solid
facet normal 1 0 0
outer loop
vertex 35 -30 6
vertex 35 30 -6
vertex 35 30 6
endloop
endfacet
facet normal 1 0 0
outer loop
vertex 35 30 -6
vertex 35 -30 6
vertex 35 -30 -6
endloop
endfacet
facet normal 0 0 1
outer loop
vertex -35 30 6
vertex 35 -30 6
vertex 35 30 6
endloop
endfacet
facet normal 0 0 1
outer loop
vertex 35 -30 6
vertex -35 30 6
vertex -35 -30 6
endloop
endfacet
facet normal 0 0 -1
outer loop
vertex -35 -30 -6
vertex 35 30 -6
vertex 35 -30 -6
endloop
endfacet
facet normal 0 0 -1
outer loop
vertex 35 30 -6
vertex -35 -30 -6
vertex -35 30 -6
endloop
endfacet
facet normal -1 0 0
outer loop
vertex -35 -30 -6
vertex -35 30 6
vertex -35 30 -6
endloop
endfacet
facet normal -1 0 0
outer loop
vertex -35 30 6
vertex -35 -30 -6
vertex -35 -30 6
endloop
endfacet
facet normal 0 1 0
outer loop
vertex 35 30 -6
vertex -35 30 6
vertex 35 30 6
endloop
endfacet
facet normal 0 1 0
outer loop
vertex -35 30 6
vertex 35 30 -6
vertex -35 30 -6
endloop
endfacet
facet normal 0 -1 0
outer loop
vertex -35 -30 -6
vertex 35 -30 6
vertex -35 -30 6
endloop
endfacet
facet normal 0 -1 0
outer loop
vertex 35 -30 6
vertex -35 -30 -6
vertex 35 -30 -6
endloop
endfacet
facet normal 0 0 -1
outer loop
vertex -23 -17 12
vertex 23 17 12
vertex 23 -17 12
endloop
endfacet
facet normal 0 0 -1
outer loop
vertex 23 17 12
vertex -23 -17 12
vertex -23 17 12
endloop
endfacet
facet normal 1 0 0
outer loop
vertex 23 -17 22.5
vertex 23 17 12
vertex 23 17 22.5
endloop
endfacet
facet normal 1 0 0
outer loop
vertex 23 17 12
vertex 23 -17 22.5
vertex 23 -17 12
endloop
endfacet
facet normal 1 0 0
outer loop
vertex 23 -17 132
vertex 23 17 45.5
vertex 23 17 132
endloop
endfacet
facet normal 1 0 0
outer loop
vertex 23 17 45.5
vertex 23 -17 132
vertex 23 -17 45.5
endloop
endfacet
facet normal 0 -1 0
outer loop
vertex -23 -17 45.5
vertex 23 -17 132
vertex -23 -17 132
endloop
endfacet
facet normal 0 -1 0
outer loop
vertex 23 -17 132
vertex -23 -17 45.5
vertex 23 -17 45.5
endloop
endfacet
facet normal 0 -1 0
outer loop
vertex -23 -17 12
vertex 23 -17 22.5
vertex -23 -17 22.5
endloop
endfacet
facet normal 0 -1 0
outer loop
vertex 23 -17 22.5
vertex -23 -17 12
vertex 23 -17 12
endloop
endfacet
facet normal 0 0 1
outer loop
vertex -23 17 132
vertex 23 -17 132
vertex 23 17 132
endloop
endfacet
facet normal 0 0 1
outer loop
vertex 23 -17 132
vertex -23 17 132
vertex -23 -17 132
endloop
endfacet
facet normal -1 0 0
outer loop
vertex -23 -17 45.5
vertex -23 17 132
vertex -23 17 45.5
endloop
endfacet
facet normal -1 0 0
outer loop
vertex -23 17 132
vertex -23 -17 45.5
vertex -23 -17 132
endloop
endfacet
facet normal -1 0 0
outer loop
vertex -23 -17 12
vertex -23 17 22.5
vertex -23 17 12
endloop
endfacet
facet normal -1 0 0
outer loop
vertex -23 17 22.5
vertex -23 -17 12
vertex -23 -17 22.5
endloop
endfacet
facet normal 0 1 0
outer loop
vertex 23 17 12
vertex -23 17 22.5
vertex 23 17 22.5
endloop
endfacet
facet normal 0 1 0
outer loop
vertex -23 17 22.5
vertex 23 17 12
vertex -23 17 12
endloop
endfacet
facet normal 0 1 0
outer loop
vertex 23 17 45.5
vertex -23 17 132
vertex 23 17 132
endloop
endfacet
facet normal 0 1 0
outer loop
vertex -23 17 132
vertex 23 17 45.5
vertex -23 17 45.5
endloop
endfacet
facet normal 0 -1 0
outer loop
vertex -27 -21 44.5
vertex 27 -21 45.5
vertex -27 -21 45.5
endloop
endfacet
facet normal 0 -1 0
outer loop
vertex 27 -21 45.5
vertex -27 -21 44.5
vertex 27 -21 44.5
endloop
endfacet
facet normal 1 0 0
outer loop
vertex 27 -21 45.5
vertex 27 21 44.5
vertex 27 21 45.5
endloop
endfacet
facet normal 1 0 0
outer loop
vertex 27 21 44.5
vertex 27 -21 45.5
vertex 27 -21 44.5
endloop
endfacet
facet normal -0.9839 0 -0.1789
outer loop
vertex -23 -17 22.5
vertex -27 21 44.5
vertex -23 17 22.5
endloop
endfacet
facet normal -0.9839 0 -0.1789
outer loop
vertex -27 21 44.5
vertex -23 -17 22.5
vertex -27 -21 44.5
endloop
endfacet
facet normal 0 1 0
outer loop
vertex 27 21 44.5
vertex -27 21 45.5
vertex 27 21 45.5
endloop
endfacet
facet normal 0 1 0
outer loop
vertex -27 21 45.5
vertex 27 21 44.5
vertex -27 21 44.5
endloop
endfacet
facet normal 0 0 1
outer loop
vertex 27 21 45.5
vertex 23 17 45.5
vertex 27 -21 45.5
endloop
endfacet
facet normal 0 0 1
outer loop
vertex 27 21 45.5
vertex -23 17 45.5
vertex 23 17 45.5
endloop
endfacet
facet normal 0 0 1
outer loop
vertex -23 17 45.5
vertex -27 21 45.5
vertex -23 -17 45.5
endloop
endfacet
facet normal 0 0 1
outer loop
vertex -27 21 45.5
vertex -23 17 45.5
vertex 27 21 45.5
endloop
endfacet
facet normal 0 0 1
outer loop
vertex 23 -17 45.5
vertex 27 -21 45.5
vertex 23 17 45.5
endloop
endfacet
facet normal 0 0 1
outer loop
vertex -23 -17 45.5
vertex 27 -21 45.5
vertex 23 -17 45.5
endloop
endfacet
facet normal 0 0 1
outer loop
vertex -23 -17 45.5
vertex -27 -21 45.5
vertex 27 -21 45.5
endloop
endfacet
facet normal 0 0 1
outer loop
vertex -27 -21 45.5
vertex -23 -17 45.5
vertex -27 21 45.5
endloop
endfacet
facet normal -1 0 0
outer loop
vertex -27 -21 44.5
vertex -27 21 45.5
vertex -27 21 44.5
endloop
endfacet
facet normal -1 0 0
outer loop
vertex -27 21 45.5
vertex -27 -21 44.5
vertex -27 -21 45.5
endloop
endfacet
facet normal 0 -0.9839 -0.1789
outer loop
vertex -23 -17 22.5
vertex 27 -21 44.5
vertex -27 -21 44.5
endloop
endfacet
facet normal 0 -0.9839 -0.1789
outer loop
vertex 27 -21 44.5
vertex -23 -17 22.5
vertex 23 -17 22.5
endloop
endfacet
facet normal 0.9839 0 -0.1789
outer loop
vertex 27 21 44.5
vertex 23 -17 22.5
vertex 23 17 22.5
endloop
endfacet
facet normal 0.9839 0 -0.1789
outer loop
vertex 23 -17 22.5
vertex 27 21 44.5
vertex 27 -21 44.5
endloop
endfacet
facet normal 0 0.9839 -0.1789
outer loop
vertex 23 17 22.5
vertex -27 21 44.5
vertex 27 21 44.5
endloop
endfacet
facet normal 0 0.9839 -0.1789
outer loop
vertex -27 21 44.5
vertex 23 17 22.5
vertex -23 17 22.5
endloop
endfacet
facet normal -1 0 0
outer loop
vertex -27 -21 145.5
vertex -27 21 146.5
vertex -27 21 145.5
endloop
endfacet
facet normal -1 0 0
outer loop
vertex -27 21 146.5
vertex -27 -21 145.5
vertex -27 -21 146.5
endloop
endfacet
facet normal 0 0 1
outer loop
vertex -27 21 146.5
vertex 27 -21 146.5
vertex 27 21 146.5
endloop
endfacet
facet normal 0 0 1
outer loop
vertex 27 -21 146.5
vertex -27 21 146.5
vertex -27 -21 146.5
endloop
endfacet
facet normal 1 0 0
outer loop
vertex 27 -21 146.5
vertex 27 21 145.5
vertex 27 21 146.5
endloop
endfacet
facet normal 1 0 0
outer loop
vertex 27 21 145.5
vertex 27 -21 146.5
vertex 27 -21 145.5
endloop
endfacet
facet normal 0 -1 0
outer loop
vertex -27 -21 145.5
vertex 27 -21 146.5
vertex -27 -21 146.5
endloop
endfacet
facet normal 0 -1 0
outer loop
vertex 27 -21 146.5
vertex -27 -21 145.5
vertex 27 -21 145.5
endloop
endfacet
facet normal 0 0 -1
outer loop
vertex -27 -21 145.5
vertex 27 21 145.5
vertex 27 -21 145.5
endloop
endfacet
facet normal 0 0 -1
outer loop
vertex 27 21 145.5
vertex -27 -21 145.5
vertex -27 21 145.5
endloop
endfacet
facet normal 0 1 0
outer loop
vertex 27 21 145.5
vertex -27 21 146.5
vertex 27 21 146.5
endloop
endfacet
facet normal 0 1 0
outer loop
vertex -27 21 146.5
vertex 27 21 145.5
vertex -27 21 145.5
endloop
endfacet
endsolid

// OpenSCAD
module ceremonial_shelf_totem(
overall_h=160,
overall_w=70,
overall_d=60,
base_h=12,
thickness=6,
body_w=46,
body_d=34,
shoulder_h=22,
top_taper_h=28,
foot_overhang=2
){
base_w = overall_w;
base_d = overall_d;

union() {
// Low, stable base
translate([0,0,0])
cube([base_w, base_d, base_h], center=true);

// Main column, centered to keep CG low and predictable
translate([0,0,base_h + (overall_h - base_h - top_taper_h)/2])
linear_extrude(height=overall_h - base_h - top_taper_h, center=true)
offset(delta=0)
square([body_w, body_d], center=true);

// Shoulder transition for a more ceremonial read
translate([0,0,base_h + shoulder_h/2])
hull() {
cube([body_w, body_d, 1], center=true);
translate([0,0,shoulder_h])
cube([body_w + 8, body_d + 8, 1], center=true);
}

// Top taper / crown
translate([0,0,overall_h - top_taper_h/2])
hull() {
cube([body_w + 8, body_d + 8, 1], center=true);
cube([thickness, thickness, 1], center=true);
}
}
}

ceremonial_shelf_totem();
